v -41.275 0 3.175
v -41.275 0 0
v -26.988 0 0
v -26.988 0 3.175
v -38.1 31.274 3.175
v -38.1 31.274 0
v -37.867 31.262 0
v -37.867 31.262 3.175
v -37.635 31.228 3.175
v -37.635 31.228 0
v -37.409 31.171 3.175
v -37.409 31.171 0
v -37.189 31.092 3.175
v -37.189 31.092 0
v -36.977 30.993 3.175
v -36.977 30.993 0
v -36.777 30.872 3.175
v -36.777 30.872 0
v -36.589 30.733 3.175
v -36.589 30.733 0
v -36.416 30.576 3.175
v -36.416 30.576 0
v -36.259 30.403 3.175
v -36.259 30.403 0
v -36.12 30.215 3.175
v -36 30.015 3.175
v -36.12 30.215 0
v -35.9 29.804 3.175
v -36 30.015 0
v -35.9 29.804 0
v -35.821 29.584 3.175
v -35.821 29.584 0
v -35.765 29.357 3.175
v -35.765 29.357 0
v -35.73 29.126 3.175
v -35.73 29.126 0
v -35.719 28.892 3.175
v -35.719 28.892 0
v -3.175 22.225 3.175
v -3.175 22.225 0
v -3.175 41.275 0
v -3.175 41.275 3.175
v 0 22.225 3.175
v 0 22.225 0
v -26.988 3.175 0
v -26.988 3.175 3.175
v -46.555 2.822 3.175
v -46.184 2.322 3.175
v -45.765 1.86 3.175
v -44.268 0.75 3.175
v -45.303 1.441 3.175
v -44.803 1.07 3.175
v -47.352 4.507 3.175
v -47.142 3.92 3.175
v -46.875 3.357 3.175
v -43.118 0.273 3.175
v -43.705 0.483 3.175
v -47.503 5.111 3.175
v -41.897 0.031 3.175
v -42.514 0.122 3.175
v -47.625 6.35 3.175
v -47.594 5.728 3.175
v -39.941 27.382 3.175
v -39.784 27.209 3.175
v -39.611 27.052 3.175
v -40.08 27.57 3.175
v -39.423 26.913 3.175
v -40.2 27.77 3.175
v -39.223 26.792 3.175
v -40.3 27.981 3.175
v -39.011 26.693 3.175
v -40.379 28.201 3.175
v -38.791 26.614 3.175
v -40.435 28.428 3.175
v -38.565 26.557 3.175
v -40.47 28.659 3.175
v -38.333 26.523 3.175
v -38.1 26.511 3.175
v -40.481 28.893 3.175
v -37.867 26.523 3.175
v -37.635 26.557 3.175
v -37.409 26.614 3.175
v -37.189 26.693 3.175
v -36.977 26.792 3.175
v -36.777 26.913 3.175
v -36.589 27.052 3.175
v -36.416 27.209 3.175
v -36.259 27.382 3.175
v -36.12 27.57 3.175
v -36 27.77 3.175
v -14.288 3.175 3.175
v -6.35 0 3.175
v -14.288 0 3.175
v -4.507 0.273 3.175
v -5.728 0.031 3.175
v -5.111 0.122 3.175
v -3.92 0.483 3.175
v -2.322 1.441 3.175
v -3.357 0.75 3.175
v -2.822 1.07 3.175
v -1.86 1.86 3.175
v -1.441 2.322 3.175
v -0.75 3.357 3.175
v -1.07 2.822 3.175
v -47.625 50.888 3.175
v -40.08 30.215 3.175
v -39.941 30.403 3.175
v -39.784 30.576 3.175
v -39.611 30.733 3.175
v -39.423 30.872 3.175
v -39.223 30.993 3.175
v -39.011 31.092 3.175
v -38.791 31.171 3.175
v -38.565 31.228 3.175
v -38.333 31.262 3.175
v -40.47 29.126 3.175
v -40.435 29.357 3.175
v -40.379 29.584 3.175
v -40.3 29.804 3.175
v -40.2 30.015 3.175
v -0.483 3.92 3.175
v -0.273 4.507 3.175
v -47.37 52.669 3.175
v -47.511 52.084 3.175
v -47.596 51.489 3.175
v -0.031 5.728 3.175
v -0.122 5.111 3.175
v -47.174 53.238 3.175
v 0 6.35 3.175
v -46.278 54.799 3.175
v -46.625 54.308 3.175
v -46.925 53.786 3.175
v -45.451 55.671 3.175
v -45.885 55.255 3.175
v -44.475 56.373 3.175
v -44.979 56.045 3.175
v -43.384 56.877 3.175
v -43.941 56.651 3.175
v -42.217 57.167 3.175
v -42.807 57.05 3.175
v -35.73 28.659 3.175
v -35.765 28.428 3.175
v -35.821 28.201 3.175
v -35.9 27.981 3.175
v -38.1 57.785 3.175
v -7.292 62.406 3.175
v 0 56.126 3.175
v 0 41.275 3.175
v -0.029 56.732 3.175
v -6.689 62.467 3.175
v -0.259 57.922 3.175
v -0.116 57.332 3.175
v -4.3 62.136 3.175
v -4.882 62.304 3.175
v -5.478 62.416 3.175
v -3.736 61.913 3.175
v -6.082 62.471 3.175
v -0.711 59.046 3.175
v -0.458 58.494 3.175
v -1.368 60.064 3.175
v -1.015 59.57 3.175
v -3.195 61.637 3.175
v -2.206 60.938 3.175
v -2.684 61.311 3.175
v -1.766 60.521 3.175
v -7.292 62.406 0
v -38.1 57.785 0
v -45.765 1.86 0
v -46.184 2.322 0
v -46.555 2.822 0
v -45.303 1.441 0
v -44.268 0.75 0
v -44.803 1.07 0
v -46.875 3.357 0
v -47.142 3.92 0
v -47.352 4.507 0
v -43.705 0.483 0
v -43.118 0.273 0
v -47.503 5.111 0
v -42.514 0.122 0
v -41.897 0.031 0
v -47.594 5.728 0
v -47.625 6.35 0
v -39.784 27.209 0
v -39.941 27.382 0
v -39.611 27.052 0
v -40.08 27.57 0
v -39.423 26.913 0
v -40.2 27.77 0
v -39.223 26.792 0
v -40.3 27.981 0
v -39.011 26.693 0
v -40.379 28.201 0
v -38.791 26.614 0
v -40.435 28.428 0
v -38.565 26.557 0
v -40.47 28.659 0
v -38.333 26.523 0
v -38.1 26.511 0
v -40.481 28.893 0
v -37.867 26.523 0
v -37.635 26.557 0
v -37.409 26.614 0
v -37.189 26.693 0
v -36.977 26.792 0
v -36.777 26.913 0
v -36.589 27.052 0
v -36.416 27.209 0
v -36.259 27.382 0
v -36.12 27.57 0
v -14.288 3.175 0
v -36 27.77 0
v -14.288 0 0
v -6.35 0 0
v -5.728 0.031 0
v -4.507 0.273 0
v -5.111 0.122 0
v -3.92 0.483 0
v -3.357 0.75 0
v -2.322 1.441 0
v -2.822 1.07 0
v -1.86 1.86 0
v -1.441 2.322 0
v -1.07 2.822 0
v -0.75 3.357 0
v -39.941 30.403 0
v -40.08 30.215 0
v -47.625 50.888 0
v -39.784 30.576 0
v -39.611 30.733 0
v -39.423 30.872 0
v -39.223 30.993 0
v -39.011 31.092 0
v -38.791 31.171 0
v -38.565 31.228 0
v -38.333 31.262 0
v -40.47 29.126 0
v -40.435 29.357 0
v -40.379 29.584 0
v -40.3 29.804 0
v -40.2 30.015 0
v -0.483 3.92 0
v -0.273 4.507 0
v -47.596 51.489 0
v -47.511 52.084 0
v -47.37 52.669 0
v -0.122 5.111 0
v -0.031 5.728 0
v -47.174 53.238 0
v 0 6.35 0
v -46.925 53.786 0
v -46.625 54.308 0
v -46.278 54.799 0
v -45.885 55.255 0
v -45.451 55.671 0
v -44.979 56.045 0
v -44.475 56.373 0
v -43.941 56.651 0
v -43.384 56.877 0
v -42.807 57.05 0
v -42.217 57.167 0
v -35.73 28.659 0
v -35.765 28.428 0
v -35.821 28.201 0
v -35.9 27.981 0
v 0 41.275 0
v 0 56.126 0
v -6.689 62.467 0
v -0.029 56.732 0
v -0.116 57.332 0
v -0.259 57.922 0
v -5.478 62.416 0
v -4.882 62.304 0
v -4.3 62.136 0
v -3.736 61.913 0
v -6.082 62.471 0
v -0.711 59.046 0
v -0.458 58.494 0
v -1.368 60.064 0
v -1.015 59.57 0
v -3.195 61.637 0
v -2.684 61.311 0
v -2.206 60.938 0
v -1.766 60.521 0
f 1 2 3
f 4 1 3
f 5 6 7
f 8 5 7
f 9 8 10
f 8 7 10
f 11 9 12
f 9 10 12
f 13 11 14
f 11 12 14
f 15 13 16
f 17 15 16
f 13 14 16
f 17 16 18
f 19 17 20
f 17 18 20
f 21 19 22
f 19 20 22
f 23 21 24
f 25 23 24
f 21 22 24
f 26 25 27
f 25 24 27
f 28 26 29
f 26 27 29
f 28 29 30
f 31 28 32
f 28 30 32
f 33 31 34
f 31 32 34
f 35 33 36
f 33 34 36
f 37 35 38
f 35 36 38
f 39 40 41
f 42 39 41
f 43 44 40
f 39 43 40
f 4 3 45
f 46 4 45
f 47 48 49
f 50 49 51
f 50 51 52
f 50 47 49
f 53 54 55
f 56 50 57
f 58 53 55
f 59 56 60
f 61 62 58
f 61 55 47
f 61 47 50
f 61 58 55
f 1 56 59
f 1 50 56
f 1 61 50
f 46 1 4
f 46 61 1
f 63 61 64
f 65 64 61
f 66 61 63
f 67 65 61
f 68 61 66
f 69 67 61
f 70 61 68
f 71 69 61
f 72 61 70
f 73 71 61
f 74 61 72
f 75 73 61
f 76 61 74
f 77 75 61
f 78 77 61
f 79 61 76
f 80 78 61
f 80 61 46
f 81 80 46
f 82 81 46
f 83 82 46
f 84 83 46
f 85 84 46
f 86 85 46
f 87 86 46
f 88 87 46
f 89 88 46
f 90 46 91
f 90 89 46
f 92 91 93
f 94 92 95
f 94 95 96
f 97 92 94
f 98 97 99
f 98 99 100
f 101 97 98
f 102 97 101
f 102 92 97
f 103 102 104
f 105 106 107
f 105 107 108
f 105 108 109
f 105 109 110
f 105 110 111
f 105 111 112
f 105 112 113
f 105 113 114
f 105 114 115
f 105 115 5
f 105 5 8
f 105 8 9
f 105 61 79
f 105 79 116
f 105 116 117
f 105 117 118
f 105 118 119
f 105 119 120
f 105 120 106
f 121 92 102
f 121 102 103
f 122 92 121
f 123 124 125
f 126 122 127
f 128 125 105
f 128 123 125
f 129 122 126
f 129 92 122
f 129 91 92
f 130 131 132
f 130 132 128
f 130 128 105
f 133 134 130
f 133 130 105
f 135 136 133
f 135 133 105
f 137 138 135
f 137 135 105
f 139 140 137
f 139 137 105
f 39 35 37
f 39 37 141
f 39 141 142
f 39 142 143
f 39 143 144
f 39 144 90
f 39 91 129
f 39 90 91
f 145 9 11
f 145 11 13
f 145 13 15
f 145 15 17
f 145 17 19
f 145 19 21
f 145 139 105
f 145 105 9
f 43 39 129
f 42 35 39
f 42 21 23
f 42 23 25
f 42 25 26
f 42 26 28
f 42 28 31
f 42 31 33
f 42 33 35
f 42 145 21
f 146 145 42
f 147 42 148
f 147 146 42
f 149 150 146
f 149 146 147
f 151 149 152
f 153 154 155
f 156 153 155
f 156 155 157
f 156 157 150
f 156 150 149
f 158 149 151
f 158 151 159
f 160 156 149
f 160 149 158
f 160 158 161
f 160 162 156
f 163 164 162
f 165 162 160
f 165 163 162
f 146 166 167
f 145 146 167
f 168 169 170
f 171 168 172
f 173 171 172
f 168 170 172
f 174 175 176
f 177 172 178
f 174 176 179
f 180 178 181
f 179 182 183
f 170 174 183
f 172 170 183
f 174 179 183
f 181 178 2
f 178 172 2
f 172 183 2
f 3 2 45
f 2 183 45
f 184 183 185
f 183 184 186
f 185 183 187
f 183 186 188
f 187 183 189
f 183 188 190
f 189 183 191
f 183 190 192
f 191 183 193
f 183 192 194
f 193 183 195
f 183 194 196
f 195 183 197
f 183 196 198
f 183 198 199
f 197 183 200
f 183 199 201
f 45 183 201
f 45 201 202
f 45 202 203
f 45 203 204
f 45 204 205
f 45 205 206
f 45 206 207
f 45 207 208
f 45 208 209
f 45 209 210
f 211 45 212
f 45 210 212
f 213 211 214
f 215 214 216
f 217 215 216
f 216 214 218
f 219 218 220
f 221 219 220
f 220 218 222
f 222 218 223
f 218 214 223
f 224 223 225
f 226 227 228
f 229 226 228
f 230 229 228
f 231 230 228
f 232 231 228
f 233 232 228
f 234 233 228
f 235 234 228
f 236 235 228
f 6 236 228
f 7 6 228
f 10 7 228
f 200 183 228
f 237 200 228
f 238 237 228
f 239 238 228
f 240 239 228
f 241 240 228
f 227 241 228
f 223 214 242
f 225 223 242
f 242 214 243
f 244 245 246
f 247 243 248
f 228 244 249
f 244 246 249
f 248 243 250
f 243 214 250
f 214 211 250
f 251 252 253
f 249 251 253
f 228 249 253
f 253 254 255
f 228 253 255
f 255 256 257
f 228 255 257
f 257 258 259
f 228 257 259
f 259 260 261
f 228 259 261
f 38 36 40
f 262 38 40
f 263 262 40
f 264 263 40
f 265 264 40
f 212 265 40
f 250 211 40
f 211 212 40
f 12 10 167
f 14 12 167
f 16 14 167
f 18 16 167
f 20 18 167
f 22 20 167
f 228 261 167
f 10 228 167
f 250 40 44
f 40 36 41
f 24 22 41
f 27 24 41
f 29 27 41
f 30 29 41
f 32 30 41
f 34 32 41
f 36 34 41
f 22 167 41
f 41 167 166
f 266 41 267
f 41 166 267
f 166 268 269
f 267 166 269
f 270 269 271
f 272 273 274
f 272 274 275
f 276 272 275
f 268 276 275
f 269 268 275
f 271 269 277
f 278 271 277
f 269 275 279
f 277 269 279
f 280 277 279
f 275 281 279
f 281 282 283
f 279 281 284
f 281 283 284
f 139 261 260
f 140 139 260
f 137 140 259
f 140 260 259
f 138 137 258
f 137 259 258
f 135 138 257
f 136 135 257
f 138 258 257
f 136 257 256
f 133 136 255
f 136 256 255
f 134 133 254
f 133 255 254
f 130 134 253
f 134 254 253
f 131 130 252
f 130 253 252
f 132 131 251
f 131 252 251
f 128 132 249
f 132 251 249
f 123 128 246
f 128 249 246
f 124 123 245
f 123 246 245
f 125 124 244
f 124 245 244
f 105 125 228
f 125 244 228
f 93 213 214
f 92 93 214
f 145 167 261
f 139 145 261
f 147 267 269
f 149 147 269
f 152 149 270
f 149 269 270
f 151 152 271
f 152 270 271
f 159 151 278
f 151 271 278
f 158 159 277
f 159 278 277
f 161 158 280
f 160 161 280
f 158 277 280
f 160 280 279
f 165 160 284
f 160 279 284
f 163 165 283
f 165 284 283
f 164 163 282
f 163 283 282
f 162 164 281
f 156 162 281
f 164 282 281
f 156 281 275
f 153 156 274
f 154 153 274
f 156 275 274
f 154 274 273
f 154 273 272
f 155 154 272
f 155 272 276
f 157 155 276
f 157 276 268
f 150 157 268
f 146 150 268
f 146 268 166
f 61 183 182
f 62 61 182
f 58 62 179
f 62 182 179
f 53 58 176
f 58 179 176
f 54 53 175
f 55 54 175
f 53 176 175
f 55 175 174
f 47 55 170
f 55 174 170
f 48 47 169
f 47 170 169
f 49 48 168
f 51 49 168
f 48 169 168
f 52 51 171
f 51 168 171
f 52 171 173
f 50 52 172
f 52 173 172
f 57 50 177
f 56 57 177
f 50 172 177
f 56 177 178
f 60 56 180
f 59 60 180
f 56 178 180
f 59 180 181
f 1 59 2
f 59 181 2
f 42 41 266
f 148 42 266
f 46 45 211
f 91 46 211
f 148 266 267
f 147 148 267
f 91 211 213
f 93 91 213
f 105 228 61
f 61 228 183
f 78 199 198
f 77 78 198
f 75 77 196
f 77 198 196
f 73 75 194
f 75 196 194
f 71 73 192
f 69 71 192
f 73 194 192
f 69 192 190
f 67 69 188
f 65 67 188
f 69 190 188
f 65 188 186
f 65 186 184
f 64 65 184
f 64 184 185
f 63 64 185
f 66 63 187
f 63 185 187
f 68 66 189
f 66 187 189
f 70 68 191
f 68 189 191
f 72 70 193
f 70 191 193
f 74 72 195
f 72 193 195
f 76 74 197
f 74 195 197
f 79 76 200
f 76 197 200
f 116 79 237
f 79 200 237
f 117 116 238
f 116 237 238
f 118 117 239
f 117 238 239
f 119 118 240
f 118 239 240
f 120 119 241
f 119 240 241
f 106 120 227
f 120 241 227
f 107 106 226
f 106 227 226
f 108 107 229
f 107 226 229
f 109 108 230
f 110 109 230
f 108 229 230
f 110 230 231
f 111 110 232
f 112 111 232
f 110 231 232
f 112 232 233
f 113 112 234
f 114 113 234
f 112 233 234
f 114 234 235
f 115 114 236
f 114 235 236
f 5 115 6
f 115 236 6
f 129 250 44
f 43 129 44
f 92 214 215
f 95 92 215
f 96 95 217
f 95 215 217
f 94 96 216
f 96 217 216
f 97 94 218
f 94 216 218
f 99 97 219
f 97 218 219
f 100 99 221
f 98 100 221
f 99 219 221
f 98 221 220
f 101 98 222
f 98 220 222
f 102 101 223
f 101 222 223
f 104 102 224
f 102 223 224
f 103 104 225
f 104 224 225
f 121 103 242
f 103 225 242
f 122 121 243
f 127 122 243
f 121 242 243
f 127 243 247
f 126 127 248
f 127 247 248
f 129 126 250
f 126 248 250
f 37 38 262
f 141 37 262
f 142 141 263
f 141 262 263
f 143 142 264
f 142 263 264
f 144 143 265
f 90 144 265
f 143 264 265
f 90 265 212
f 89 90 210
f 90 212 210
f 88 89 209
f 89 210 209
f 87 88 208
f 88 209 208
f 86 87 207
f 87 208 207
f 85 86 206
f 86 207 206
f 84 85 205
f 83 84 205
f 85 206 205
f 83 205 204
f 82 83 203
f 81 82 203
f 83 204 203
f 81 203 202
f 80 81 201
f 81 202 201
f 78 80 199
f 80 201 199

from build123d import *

# Parameters (mm, degrees)
BOSS_EXTRUDE1_DEPTH = 3.175


with BuildPart() as part:
    # Sketch1 → Boss-Extrude1 (new body)
    with BuildSketch(Plane.XY):
        with BuildLine():
            Line((-38.1, 31.27375), (-38.1, 57.785))
            Line((-38.1, 57.785), (-42.216961876, 57.167455719))
            ThreePointArc((-42.216961876, 57.167455719), (-46.086650336, 55.031442621), (-47.625, 50.887709878))
            Line((-47.625, 50.887709878), (-47.625, 6.35))
            ThreePointArc((-47.625, 6.35), (-45.765128061, 1.859871939), (-41.275, 0))
            Line((-41.275, 0), (-38.1, 0))
            Line((-38.1, 0), (-38.1, 26.51125))
            ThreePointArc((-38.1, 26.51125), (-40.48125, 28.8925), (-38.1, 31.27375))
        make_face()
        with BuildLine():
            Line((0, 41.275), (0, 56.126459878))
            ThreePointArc((0, 56.126459878), (-2.206267257, 60.938110214), (-7.291961876, 62.406205719))
            Line((-7.291961876, 62.406205719), (-38.1, 57.785))
            Line((-38.1, 57.785), (-38.1, 31.27375))
            ThreePointArc((-38.1, 31.27375), (-36.416201977, 30.576298023), (-35.71875, 28.8925))
            ThreePointArc((-35.71875, 28.8925), (-36.416201977, 27.208701977), (-38.1, 26.51125))
            Line((-38.1, 26.51125), (-38.1, 0))
            Line((-38.1, 0), (-26.9875, 0))
            Line((-26.9875, 0), (-26.9875, 3.175))
            Line((-26.9875, 3.175), (-14.2875, 3.175))
            Line((-14.2875, 3.175), (-14.2875, 0))
            Line((-14.2875, 0), (-6.35, 0))
            ThreePointArc((-6.35, 0), (-1.859871939, 1.859871939), (0, 6.35))
            Line((0, 6.35), (0, 22.225))
            Line((0, 22.225), (-3.175, 22.225))
            Line((-3.175, 22.225), (-3.175, 41.275))
            Line((-3.175, 41.275), (0, 41.275))
        make_face()
    extrude(amount=BOSS_EXTRUDE1_DEPTH)


solid = part.part
